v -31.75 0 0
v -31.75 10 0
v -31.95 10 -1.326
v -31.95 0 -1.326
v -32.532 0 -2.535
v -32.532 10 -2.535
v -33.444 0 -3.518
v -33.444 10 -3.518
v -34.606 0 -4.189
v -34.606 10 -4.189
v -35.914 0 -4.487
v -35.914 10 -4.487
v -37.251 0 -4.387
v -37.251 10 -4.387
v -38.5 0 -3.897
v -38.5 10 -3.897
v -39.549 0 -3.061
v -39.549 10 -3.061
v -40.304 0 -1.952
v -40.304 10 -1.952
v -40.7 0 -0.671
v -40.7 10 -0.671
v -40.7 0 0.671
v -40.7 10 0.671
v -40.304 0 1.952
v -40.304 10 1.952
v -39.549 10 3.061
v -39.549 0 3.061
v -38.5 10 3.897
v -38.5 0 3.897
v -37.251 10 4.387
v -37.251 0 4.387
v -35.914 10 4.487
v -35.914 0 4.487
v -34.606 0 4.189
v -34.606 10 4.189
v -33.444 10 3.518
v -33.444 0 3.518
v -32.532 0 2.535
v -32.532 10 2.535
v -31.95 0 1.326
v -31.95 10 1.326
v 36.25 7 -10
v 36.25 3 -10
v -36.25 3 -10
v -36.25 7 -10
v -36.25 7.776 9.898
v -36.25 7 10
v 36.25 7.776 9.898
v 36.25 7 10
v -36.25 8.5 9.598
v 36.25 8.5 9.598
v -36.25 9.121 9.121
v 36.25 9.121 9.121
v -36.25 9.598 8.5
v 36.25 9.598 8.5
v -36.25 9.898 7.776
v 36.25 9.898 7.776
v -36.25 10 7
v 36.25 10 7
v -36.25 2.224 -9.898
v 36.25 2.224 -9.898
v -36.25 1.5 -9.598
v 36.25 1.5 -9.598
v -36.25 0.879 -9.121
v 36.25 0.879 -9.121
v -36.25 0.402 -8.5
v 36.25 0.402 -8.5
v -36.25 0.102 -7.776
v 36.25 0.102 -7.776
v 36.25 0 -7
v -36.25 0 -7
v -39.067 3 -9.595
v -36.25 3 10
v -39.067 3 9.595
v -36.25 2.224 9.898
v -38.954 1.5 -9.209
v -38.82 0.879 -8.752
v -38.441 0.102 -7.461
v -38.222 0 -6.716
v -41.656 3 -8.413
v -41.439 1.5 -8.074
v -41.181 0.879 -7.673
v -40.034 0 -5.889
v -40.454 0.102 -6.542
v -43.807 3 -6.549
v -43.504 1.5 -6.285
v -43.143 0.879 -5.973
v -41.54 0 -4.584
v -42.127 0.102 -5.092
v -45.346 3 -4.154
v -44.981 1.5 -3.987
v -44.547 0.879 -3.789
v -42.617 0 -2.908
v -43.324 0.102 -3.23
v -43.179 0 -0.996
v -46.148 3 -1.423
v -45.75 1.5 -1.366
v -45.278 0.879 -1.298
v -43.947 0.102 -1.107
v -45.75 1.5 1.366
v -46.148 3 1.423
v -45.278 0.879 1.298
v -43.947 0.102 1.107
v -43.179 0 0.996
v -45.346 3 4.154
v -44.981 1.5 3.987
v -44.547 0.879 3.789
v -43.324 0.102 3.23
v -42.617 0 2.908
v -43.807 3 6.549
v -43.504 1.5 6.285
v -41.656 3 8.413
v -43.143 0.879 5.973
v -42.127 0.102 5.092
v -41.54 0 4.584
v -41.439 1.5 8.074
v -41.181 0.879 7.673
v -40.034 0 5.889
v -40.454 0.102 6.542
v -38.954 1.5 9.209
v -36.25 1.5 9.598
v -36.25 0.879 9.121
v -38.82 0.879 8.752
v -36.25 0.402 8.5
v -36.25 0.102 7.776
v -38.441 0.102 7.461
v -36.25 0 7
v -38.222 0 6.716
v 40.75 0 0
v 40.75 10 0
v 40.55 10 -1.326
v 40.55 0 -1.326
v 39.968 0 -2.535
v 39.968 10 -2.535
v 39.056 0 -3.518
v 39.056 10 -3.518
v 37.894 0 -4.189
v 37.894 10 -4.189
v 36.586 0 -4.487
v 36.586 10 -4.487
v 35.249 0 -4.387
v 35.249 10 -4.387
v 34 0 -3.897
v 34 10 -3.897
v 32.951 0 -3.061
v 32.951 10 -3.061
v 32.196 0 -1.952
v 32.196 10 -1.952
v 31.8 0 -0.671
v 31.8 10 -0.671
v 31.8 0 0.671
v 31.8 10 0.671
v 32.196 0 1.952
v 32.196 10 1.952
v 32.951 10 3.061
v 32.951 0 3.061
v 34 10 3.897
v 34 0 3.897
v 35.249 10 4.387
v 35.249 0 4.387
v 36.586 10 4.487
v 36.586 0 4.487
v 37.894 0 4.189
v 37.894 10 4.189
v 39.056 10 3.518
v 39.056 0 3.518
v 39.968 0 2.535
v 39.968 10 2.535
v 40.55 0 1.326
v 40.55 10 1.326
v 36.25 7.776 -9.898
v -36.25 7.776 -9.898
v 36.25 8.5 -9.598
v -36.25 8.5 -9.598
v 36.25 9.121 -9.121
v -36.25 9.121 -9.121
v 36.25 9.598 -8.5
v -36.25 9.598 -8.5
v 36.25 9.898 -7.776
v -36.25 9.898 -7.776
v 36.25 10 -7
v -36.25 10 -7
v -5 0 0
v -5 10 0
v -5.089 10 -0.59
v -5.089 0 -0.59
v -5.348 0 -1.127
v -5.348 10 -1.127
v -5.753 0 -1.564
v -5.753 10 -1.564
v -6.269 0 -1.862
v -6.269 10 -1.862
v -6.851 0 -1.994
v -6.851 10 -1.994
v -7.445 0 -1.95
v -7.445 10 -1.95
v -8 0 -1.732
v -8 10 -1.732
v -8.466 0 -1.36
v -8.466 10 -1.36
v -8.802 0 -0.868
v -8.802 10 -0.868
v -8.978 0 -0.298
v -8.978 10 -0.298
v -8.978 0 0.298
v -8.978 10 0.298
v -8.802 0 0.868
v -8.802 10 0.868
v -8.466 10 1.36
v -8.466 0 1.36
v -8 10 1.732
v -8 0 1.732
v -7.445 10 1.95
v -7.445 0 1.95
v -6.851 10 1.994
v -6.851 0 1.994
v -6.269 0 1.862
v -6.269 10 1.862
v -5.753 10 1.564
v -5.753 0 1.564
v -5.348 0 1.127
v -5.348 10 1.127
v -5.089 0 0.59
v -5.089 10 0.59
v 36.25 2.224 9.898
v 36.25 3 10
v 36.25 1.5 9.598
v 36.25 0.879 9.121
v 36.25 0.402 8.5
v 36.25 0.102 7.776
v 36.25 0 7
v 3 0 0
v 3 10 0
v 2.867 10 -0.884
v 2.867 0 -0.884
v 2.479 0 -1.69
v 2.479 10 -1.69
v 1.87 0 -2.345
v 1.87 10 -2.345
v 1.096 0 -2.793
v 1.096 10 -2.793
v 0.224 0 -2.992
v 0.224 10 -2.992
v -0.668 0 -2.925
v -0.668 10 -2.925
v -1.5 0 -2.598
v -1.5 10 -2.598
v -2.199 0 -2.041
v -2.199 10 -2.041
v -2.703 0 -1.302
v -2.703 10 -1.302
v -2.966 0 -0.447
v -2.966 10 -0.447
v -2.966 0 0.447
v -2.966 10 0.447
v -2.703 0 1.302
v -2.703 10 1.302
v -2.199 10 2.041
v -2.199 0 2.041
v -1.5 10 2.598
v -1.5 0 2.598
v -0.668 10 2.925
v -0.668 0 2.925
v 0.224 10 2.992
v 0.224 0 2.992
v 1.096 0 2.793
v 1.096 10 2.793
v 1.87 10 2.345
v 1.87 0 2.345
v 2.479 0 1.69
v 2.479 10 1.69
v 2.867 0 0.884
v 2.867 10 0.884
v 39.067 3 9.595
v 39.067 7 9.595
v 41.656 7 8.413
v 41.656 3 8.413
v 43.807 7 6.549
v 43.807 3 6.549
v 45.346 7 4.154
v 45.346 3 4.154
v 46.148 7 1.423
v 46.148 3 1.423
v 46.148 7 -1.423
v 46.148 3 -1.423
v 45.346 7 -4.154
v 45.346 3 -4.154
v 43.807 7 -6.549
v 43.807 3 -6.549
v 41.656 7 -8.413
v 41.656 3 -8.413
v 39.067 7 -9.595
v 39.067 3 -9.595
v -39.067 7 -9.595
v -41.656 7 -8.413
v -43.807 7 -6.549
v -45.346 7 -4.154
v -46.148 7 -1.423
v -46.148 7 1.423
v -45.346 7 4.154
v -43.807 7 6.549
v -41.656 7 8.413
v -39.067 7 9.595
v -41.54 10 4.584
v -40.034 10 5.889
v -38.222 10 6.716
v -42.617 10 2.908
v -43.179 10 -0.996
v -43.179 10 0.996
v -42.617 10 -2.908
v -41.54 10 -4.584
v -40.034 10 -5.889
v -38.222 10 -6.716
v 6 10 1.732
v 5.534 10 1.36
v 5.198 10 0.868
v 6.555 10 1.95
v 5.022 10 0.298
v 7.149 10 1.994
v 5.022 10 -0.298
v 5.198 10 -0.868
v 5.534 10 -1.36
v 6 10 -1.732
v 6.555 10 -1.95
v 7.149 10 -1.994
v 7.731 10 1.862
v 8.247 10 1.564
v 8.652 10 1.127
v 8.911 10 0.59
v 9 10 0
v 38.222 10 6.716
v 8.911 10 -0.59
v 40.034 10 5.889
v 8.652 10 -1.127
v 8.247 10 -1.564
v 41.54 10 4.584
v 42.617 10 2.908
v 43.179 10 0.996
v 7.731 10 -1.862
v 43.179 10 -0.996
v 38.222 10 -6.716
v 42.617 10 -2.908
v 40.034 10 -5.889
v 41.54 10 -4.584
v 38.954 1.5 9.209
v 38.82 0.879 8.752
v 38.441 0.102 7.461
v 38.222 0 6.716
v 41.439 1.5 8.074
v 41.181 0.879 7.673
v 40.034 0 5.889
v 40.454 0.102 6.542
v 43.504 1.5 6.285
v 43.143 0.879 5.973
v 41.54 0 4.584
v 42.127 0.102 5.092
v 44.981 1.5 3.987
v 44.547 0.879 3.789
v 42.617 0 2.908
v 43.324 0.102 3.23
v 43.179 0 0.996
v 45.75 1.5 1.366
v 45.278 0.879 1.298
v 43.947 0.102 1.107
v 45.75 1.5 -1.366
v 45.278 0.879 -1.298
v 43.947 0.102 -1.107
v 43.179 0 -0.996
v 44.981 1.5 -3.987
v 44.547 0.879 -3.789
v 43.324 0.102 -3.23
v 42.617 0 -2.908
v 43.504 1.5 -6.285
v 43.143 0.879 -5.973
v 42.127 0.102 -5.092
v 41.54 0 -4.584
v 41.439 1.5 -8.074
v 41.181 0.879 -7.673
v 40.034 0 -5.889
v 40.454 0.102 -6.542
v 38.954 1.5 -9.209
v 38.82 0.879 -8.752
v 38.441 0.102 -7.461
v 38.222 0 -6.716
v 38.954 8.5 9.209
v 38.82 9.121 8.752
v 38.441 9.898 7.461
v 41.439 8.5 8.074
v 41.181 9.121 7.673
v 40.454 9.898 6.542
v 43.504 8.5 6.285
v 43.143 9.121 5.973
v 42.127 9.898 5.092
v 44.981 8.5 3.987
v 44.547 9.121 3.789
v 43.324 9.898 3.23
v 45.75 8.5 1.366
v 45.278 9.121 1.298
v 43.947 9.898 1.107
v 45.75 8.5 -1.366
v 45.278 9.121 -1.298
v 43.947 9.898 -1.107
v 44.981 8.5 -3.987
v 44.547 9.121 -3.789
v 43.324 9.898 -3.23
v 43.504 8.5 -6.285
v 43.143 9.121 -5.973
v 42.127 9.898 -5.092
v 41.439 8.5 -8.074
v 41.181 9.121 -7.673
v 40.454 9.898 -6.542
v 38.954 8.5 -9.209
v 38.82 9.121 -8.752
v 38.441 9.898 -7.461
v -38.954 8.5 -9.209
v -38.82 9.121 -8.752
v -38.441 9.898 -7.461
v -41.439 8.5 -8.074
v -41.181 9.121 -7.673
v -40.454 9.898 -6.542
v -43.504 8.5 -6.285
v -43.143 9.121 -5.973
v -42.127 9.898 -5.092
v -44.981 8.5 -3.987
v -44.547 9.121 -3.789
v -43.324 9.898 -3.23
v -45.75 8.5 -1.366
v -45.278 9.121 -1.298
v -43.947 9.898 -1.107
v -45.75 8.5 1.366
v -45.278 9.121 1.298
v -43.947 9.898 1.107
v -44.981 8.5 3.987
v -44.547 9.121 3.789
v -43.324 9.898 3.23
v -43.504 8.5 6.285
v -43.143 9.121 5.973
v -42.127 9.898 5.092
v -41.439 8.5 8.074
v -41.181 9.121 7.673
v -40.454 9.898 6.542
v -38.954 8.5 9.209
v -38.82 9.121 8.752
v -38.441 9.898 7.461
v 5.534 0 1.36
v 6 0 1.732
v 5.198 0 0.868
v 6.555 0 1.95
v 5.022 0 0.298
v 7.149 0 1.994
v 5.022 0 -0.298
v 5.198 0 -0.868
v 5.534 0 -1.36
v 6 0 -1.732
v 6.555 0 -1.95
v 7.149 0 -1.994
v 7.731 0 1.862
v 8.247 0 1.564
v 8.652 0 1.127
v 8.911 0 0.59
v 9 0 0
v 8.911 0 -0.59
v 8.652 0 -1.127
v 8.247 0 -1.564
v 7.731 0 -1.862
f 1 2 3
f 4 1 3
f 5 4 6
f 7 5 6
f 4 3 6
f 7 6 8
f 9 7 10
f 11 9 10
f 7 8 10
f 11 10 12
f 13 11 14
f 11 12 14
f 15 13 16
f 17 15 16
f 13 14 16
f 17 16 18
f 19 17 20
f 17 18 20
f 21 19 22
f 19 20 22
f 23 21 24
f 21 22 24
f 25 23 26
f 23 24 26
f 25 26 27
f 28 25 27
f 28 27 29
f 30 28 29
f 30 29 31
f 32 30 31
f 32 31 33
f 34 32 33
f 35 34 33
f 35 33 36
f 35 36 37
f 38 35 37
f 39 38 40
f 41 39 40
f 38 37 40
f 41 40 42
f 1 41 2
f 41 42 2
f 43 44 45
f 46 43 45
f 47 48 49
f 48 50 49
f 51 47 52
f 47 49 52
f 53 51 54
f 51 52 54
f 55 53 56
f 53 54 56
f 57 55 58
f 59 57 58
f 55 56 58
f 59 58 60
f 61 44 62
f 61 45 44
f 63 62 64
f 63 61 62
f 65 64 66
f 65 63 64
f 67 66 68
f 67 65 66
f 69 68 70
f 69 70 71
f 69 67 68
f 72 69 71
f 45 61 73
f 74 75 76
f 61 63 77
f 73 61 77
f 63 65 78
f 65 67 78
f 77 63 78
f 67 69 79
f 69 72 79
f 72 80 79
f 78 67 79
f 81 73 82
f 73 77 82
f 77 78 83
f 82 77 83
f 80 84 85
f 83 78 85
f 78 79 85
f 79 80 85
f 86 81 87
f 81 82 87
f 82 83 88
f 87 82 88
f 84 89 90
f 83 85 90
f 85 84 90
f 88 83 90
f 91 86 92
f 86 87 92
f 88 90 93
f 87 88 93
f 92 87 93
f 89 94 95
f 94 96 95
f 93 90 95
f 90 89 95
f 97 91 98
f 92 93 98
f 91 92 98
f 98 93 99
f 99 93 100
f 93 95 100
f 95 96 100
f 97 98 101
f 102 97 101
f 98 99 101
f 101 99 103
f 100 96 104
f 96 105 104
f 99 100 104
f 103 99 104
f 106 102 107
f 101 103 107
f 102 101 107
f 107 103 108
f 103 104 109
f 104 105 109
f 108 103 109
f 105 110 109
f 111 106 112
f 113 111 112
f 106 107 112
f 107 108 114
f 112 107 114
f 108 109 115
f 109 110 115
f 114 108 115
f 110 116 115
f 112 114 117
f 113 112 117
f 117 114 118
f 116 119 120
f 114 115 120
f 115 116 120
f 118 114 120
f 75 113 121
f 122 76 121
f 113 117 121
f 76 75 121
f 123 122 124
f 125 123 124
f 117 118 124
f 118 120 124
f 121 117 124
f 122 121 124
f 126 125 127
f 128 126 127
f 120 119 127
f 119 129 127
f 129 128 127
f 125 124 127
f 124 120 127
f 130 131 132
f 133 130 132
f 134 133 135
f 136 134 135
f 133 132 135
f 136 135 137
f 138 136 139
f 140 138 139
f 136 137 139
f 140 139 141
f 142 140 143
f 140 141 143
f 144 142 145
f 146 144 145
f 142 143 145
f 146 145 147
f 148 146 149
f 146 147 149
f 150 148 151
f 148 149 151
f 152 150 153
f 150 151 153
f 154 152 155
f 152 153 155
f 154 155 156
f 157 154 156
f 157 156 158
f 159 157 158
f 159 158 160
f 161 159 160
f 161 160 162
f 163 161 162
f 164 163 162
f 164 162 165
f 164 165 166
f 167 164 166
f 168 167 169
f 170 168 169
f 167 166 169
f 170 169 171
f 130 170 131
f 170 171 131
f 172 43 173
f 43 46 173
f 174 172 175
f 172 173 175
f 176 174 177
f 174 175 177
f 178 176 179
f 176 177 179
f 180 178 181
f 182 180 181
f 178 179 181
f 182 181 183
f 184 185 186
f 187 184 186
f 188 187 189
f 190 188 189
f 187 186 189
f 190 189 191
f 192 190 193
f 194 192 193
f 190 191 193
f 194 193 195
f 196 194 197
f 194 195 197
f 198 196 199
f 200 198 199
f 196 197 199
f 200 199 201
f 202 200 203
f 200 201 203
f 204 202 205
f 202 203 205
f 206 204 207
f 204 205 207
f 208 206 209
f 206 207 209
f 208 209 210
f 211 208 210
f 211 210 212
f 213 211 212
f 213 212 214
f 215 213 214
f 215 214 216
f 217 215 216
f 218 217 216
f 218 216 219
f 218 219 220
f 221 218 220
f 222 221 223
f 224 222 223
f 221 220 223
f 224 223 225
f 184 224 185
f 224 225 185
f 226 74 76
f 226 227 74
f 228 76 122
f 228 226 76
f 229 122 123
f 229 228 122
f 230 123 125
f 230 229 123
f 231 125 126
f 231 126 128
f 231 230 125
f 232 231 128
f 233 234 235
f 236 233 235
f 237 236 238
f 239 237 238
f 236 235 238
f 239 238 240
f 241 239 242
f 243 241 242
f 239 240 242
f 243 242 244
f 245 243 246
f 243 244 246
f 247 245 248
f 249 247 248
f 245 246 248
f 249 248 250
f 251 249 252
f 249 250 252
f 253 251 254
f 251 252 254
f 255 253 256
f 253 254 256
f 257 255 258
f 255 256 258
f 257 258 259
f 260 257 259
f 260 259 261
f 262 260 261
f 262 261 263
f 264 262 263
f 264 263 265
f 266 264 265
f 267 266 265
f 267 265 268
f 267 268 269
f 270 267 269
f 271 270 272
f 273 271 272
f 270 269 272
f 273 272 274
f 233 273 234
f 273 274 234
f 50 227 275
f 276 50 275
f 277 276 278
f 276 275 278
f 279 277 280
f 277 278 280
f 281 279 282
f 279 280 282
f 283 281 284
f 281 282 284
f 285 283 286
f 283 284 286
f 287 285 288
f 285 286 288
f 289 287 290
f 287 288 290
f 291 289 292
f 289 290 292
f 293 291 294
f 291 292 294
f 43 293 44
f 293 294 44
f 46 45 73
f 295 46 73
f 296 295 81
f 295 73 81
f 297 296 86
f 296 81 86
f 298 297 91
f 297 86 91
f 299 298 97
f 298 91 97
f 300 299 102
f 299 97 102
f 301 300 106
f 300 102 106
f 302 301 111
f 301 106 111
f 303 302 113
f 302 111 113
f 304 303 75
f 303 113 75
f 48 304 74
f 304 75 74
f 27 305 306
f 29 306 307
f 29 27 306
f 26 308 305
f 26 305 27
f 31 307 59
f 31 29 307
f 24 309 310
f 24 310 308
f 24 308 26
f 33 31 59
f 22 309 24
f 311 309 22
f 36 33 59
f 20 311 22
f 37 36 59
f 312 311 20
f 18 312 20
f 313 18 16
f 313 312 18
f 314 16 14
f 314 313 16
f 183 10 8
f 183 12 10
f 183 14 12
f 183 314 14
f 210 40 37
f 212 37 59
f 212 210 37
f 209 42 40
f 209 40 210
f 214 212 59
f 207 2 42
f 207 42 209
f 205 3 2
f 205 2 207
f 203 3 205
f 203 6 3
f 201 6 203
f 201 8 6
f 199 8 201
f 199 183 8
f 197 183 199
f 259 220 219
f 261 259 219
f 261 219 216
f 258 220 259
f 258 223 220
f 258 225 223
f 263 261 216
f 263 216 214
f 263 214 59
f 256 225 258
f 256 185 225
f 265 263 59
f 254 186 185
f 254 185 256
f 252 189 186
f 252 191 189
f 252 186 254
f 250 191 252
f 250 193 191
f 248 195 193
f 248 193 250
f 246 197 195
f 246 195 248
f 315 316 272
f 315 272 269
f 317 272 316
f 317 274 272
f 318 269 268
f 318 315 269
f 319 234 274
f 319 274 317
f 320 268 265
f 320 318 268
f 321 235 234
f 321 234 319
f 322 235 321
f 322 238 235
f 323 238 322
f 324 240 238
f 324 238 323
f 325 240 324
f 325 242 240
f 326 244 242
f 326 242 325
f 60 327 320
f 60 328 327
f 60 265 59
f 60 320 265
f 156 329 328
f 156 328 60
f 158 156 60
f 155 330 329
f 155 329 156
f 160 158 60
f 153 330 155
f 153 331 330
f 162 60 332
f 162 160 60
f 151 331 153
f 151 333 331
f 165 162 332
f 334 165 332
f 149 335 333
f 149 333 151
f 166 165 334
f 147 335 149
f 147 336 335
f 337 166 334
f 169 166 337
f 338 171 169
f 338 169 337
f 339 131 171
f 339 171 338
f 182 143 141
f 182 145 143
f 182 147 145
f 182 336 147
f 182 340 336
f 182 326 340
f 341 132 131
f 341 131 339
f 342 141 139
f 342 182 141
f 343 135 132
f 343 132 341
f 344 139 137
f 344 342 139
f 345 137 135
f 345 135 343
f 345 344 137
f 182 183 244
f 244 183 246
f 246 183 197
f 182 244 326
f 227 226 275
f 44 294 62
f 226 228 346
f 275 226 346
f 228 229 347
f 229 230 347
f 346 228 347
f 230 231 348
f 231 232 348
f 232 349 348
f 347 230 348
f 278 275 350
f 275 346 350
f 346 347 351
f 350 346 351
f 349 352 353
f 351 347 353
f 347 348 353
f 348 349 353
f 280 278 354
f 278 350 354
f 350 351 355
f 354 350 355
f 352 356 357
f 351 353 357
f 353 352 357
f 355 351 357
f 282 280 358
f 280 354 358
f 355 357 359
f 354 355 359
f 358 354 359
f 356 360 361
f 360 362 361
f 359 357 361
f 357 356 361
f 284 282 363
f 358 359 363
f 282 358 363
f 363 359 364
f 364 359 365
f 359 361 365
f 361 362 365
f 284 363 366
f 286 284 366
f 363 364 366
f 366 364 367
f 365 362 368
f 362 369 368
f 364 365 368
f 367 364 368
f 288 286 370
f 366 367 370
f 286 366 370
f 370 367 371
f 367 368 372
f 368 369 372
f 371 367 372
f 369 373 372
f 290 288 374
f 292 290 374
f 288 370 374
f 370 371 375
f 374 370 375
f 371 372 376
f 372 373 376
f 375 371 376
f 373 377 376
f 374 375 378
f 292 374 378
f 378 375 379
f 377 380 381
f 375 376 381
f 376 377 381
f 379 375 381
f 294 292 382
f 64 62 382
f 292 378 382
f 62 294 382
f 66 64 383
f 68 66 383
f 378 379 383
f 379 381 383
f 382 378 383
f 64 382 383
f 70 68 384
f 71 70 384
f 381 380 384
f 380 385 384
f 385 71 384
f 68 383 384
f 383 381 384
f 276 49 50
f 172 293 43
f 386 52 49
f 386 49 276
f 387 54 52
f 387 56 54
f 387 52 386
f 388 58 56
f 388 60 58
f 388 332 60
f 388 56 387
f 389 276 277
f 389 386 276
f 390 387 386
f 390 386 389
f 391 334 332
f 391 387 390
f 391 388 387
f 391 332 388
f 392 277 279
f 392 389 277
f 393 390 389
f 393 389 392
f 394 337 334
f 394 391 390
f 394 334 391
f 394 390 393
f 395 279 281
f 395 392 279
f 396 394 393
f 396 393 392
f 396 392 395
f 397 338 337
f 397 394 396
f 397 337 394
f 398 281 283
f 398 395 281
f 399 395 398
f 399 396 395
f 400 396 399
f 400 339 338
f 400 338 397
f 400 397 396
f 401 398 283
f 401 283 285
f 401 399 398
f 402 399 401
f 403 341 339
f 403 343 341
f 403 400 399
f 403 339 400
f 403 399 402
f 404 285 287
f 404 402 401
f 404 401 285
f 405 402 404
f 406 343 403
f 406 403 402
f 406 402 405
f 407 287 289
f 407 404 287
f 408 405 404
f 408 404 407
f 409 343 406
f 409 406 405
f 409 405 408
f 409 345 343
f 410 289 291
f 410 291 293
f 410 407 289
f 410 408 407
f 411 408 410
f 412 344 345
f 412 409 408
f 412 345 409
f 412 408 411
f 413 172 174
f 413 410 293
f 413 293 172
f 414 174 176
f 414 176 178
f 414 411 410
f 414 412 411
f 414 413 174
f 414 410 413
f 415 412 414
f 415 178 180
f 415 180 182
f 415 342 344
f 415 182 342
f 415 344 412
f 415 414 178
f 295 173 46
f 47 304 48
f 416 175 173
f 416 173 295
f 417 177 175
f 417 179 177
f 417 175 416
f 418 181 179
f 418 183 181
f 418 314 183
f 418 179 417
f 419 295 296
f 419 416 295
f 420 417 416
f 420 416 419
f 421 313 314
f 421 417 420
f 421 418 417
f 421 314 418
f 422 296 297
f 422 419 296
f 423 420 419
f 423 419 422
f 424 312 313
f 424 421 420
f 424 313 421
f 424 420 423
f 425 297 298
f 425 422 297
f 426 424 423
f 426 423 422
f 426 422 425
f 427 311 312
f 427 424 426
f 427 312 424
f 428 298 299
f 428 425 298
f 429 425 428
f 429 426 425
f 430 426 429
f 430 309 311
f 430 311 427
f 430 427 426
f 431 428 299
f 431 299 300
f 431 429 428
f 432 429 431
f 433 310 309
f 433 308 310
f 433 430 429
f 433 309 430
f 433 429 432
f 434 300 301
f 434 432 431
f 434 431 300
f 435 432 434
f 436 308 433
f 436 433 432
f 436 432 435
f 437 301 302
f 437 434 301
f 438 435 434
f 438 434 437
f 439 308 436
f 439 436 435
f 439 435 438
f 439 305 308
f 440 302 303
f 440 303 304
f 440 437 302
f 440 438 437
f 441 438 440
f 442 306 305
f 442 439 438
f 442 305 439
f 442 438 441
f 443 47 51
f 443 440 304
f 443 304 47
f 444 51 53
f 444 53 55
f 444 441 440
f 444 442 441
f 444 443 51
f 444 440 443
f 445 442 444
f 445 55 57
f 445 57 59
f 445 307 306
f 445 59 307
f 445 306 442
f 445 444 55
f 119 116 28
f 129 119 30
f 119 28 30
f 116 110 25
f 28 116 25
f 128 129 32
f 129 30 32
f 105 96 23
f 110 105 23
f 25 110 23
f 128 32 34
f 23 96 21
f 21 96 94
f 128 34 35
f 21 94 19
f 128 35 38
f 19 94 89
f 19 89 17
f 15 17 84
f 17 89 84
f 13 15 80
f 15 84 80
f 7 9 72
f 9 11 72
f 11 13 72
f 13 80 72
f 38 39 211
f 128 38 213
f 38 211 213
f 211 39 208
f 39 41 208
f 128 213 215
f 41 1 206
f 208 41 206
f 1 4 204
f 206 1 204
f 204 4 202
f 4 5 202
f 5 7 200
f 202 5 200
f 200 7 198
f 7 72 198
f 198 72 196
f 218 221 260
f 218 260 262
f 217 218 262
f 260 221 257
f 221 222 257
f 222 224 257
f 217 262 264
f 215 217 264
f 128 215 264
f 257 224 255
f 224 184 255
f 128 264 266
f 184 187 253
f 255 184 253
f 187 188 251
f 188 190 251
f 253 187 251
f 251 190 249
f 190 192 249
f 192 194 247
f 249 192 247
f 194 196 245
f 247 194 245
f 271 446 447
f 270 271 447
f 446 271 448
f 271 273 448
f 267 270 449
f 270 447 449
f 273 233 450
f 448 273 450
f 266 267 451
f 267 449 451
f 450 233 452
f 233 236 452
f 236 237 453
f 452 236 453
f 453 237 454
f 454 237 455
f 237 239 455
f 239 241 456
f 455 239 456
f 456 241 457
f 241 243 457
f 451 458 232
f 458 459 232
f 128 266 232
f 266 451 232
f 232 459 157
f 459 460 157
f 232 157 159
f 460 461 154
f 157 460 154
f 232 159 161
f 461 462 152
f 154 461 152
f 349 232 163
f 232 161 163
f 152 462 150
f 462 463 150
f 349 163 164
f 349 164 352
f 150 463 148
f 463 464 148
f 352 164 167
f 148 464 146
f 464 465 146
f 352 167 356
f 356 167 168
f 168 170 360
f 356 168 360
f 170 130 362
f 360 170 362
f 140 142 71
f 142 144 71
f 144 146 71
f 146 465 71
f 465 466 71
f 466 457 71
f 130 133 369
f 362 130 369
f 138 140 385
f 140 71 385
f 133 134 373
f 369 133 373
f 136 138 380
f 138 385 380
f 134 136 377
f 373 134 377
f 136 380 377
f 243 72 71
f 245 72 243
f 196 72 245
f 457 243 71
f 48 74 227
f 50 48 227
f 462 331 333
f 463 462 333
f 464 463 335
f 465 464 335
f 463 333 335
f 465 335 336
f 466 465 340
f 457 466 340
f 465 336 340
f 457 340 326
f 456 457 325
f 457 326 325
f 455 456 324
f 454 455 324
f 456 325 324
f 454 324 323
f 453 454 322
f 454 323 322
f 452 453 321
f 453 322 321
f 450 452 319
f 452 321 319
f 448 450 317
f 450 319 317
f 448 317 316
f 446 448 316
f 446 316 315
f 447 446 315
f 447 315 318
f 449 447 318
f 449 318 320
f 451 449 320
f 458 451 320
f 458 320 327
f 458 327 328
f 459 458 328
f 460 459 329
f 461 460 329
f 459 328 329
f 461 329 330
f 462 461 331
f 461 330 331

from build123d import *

# Parameters (mm, degrees)
SKETCH2_R           = 5
BOSS_EXTRUDE1_DEPTH = 10
FILLET1_R           = 3
BOSS_EXTRUDE2_DEPTH = 10
SKETCH5_R           = 5
SKETCH5_R_2         = 4.5
BOSS_EXTRUDE3_DEPTH = 10
SKETCH6_R           = 2
CUT_EXTRUDE1_DEPTH  = 10
SKETCH7_R           = 3
CUT_EXTRUDE2_DEPTH  = 10


with BuildPart() as part:
    # Sketch2 → Boss-Extrude1 (new body)
    with BuildSketch(Plane(origin=(0, 0, 0), x_dir=(1, 0, 0), z_dir=(0, 1, 0))):
        with BuildLine():
            Line((36.25, 10), (-36.25, 10))
            ThreePointArc((-36.25, 10), (-46.25, 0), (-36.25, -10))
            Line((-36.25, -10), (36.25, -10))
            ThreePointArc((36.25, -10), (46.25, 0), (36.25, 10))
        make_face()
        with Locations((-36.25, 0)):
            Circle(SKETCH2_R, mode=Mode.SUBTRACT)
        with BuildLine():
            ThreePointArc((5, 0), (3.535533906, -3.535533906), (0, -5))
            ThreePointArc((0, -5), (-5, 0), (0, 5))
            ThreePointArc((0, 5), (3.535533906, 3.535533906), (5, 0))
        make_face(mode=Mode.SUBTRACT)
        with Locations((36.25, 0)):
            Circle(SKETCH2_R, mode=Mode.SUBTRACT)
    extrude(amount=BOSS_EXTRUDE1_DEPTH)

    # Fillet1
    fillet1_edges = [part.edges().sort_by_distance(p)[0] for p in [
        (46.25, 0, 0),
        (0, 0, 10),
        (0, 10, 10),
        (46.25, 10, 0),
        (0, 10, -10),
        (-46.25, 10, 0),
        (-46.25, 0, 0),
        (0, 0, -10),
    ]]
    fillet(fillet1_edges, radius=FILLET1_R)

    # Sketch3 → Boss-Extrude2 (add)
    with BuildSketch(Plane(origin=(0, 10, 0), x_dir=(1, 0, 0), z_dir=(0, 1, 0))):
        with BuildLine():
            Line((5, 0), (0, 0))
            Line((0, 0), (-5, 0))
            ThreePointArc((-5, 0), (0, -5), (5, 0))
        make_face()
        with BuildLine():
            Line((-5, 0), (0, 0))
            Line((0, 0), (5, 0))
            ThreePointArc((5, 0), (0, 5), (-5, 0))
        make_face()
    extrude(amount=-BOSS_EXTRUDE2_DEPTH)

    # Sketch5 → Boss-Extrude3 (add)
    with BuildSketch(Plane(origin=(0, 10, 0), x_dir=(1, 0, 0), z_dir=(0, 1, 0))):
        with Locations((-36.25, 0)):
            Circle(SKETCH5_R)
        with Locations((-36.25, 0)):
            Circle(SKETCH5_R_2, mode=Mode.SUBTRACT)
        with Locations((36.25, 0)):
            Circle(SKETCH5_R)
        with Locations((36.25, 0)):
            Circle(SKETCH5_R_2, mode=Mode.SUBTRACT)
    extrude(amount=-BOSS_EXTRUDE3_DEPTH)

    # Sketch6 → Cut-Extrude1 (cut)
    with BuildSketch(Plane(origin=(0, 10, 0), x_dir=(1, 0, 0), z_dir=(0, 1, 0))):
        with Locations((-7, 0)):
            Circle(SKETCH6_R)
        with Locations((7, 0)):
            Circle(SKETCH6_R)
    extrude(amount=-CUT_EXTRUDE1_DEPTH, mode=Mode.SUBTRACT)

    # Sketch7 → Cut-Extrude2 (cut)
    with BuildSketch(Plane(origin=(0, 10, 0), x_dir=(1, 0, 0), z_dir=(0, 1, 0))):
        Circle(SKETCH7_R)
    extrude(amount=-CUT_EXTRUDE2_DEPTH, mode=Mode.SUBTRACT)


solid = part.part
